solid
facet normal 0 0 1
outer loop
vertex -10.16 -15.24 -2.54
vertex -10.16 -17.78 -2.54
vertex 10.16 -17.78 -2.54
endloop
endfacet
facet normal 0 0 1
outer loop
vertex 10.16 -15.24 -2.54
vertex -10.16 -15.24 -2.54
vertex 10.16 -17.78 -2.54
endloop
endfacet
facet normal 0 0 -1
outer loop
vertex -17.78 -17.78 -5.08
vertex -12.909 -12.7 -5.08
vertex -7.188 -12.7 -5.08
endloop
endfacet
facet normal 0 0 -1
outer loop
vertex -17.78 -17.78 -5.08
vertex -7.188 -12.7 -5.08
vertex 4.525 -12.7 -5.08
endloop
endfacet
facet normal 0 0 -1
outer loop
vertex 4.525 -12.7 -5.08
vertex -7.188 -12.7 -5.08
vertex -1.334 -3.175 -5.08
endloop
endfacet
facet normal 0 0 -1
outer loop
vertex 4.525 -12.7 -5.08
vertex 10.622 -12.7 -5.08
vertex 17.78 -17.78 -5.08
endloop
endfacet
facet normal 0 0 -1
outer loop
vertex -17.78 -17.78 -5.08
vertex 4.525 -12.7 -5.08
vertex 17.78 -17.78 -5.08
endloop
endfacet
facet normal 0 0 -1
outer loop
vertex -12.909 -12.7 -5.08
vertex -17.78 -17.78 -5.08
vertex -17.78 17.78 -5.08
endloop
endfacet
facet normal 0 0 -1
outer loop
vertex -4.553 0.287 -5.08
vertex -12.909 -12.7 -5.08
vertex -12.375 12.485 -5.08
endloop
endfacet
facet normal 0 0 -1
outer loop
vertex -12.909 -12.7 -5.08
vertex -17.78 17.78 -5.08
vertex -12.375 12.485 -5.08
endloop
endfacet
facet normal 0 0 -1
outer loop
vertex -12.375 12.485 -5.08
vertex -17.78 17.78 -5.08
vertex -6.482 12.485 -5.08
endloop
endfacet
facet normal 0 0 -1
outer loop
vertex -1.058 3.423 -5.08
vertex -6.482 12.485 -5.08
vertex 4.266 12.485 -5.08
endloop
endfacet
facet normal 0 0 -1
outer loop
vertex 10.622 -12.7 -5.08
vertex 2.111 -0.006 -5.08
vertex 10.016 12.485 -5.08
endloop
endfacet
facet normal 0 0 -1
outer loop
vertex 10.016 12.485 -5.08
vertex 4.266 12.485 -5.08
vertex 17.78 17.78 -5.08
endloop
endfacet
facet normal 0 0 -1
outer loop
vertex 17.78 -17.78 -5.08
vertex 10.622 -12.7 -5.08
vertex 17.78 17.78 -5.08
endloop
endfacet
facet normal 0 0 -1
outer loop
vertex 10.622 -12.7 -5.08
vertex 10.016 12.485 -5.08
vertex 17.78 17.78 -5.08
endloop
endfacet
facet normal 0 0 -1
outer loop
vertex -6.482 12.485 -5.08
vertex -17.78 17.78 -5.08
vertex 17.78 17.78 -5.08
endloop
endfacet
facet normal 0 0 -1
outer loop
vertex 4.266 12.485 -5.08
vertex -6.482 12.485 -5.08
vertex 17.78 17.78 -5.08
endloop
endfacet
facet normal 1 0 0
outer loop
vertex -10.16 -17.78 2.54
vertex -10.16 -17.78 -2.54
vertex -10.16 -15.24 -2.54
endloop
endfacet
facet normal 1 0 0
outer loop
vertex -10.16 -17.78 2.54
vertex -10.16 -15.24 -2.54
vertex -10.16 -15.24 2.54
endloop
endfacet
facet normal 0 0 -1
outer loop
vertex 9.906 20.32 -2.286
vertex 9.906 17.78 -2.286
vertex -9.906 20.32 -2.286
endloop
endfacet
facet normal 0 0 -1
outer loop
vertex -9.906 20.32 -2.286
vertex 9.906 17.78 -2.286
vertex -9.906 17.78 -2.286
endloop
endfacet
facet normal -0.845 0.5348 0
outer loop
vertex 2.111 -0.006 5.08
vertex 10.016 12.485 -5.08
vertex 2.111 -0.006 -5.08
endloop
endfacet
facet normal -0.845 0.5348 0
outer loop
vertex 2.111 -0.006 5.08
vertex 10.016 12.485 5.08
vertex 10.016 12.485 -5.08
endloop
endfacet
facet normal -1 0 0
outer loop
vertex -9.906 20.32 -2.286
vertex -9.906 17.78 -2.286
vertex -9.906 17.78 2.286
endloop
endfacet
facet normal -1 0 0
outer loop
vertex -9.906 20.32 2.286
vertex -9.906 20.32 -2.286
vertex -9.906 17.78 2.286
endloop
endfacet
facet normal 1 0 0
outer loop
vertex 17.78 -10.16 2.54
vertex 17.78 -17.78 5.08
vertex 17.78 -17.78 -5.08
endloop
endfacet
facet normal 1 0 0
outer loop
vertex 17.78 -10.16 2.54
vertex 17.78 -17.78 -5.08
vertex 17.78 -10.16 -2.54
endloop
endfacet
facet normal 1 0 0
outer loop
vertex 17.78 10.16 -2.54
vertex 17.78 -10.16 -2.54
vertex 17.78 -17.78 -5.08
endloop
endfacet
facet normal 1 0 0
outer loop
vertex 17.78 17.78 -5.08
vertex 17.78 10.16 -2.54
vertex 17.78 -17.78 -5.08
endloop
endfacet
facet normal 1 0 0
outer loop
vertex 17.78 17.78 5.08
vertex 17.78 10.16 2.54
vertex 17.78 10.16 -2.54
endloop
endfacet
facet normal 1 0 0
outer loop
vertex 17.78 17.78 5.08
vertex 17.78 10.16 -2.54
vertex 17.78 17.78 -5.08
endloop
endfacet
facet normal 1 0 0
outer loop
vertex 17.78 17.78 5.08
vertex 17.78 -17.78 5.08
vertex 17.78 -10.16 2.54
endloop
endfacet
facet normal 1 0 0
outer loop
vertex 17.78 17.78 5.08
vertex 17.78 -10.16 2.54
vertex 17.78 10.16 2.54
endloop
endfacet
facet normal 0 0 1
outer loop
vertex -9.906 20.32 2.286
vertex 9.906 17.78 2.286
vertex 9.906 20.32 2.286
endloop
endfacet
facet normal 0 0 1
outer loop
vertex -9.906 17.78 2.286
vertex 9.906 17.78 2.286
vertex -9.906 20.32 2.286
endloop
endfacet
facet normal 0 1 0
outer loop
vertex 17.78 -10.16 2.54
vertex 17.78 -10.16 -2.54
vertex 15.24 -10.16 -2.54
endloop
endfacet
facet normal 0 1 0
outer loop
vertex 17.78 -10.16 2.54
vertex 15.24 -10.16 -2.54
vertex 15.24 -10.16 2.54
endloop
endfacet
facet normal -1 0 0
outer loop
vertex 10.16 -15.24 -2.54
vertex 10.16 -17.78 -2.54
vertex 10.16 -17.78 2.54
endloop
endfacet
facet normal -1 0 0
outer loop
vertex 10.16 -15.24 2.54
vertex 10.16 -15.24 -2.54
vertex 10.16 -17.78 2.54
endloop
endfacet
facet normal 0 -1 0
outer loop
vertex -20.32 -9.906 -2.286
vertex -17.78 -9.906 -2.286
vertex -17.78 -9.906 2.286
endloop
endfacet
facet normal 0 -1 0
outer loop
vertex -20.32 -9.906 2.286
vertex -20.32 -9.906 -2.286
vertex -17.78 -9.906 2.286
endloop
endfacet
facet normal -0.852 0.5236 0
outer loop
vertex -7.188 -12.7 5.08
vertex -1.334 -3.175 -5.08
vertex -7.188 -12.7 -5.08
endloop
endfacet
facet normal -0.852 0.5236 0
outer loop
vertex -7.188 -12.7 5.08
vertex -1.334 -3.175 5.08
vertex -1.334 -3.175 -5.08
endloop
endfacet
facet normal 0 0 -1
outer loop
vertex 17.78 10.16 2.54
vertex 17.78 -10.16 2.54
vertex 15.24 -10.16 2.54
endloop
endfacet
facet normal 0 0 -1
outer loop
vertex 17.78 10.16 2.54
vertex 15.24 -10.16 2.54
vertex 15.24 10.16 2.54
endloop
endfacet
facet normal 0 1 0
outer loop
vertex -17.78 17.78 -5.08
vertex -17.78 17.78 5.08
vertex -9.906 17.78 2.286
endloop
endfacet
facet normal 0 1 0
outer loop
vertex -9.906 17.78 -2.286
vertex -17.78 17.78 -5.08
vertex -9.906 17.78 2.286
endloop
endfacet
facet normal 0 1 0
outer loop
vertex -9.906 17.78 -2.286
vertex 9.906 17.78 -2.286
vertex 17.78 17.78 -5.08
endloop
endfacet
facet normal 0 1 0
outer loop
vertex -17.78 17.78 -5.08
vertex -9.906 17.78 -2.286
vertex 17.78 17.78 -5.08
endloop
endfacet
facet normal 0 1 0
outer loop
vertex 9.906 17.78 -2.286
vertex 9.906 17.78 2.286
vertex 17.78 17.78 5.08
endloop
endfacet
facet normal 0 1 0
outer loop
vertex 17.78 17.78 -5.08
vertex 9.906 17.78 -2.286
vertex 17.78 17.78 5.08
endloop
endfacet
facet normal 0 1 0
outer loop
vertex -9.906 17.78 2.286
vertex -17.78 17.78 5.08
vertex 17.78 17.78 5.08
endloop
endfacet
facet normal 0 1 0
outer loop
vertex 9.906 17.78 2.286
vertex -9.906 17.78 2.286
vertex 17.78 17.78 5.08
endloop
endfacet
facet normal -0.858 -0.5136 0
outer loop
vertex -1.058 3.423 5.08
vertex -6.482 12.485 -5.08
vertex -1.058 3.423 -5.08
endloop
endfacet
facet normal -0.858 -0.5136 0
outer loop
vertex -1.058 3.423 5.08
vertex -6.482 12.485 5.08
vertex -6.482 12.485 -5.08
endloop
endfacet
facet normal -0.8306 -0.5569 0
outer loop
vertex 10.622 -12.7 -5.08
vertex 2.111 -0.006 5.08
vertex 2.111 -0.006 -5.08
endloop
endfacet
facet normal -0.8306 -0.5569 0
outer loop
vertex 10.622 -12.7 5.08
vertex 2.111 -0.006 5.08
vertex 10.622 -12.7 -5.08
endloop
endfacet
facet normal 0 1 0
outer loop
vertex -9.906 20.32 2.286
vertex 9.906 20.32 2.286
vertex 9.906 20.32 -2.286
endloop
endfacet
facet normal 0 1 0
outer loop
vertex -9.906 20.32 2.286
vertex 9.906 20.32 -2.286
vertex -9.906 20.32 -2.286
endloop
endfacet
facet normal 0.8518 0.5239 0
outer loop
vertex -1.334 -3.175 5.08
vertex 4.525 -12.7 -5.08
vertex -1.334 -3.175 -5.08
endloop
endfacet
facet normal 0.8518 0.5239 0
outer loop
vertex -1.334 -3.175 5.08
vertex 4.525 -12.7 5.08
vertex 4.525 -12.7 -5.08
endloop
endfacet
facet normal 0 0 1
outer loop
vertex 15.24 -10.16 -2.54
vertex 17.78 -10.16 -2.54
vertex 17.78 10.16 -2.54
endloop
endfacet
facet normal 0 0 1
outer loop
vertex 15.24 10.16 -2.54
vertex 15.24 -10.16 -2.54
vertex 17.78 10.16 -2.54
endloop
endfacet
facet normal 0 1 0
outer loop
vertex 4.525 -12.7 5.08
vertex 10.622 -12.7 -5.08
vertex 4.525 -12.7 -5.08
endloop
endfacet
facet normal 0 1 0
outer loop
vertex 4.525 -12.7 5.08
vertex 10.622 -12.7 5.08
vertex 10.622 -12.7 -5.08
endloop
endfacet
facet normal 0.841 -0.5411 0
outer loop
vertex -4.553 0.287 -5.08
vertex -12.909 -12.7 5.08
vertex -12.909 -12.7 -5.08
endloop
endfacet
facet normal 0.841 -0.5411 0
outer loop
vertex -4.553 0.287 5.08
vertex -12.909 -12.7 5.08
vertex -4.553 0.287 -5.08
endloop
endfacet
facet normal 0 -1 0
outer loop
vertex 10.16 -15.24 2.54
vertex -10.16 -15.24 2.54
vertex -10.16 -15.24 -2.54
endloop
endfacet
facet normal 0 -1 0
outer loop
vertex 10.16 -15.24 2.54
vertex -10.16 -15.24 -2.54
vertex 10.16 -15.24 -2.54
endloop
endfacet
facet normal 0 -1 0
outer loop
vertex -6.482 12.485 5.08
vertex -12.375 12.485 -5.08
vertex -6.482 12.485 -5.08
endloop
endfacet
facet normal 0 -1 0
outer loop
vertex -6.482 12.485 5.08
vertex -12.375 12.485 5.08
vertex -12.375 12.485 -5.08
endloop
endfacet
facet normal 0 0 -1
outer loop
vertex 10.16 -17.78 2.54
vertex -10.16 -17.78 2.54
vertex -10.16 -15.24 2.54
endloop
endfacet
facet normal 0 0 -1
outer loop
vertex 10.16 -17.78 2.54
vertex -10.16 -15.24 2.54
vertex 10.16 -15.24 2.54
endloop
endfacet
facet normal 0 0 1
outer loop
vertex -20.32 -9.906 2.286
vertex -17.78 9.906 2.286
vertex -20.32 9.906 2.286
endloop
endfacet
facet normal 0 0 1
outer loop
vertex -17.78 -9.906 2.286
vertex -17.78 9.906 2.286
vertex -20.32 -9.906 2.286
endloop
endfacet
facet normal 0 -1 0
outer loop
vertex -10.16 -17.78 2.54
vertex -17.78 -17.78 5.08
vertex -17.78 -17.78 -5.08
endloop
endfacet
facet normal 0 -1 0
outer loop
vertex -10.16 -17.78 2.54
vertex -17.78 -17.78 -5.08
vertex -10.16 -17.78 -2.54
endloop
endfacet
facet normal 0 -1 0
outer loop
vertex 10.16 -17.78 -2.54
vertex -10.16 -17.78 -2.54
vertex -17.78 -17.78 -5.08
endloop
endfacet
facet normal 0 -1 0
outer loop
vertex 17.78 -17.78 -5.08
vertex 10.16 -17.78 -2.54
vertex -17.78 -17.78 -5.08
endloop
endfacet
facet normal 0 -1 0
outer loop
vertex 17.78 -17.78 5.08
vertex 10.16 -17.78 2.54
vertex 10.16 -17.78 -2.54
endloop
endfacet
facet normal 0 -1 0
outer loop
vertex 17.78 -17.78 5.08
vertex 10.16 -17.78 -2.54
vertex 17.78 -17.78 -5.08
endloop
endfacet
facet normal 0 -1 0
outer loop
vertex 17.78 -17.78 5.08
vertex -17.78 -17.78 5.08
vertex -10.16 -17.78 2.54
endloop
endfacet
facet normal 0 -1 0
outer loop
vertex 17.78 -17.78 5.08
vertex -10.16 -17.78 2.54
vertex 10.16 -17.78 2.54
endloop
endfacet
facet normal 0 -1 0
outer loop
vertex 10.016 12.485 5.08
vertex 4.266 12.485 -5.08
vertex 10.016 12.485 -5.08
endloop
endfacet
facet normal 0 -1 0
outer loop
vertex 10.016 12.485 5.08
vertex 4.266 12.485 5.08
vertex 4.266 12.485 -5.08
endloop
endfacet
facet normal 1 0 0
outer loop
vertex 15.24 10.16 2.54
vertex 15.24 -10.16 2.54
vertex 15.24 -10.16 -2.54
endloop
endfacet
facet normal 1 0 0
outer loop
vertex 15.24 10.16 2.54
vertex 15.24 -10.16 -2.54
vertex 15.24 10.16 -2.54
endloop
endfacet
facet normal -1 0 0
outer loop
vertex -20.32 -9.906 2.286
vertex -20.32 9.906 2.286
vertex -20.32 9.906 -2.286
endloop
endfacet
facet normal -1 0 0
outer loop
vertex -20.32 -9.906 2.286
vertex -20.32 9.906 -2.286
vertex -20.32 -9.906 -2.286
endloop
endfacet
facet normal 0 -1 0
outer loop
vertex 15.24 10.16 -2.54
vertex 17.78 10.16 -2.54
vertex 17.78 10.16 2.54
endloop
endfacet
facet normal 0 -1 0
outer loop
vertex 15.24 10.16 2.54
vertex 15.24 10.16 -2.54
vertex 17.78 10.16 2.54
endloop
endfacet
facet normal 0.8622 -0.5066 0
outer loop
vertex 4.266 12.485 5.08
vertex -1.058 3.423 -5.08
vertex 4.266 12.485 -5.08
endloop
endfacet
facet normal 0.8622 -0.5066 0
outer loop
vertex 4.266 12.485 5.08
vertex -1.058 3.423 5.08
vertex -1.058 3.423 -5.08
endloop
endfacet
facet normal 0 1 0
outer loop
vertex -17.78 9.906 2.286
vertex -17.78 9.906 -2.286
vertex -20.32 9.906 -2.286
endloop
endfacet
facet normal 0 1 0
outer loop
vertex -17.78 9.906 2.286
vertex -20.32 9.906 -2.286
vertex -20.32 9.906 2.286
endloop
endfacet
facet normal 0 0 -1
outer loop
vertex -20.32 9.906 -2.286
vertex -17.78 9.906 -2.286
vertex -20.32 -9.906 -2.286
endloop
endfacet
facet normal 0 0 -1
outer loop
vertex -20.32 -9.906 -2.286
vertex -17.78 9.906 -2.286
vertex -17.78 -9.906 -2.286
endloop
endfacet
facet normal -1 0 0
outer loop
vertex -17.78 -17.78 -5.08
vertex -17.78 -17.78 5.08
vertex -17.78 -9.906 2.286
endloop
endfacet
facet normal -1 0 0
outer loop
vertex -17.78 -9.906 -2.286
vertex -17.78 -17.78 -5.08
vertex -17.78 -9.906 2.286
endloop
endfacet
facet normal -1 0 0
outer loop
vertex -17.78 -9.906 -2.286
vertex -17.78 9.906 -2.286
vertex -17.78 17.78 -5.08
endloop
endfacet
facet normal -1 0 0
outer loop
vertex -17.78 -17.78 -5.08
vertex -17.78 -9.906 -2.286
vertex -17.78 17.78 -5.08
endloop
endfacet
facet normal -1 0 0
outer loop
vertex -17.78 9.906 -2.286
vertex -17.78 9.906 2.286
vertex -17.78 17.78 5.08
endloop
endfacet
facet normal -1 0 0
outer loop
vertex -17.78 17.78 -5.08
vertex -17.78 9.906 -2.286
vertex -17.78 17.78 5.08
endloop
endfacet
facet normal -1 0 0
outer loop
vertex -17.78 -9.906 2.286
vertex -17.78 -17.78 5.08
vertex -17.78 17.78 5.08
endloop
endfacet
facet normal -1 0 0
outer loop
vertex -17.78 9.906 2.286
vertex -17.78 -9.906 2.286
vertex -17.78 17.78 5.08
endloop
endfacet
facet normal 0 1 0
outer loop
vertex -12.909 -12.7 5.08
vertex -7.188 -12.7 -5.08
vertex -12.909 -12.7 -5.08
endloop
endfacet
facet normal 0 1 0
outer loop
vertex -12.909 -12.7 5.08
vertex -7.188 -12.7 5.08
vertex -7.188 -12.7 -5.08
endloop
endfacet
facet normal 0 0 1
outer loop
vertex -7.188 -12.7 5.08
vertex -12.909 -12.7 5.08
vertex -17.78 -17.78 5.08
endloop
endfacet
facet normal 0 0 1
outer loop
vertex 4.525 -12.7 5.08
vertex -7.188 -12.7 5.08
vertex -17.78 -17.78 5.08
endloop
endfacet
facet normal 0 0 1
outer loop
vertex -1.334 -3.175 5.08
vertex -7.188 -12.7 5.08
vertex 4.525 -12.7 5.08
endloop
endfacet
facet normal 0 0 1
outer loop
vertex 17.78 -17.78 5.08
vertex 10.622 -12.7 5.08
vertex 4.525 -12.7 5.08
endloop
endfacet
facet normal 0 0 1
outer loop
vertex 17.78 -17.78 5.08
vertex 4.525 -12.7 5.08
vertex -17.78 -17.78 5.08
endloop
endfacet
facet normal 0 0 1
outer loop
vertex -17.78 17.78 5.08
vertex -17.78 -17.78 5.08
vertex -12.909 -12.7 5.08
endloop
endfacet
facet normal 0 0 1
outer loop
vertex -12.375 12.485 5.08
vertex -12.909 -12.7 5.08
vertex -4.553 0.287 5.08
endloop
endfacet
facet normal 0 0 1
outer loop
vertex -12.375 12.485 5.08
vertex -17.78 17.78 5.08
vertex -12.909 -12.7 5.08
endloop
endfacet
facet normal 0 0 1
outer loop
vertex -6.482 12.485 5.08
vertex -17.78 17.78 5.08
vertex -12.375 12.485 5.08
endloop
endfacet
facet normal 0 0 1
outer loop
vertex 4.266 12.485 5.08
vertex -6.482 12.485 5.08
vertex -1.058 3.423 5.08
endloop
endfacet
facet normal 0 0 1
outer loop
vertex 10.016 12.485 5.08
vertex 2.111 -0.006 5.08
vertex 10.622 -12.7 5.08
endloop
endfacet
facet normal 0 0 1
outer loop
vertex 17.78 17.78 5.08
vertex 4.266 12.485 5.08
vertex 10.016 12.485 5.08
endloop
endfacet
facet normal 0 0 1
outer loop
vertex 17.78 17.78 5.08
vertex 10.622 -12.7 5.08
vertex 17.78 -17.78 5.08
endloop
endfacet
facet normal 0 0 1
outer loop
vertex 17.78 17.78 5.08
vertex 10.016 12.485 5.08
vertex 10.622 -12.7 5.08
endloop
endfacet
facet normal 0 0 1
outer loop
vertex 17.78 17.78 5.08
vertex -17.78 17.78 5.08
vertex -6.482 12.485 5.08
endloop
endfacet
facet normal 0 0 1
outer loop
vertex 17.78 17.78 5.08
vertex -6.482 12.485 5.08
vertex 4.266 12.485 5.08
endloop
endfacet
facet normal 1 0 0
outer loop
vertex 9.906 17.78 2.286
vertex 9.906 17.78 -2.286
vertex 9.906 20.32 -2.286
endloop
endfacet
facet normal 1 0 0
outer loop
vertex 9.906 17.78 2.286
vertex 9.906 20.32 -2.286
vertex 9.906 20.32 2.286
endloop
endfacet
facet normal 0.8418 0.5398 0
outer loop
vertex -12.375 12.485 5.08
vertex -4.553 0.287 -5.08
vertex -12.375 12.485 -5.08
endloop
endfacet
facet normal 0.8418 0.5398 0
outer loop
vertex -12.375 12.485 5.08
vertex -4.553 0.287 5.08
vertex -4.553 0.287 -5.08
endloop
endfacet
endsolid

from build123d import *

# Parameters (mm, degrees)
F0_W     = 35.56
F0_H     = 35.56
F1_DEPTH = 5.08
F2_W     = 19.812
F2_H     = 4.572
F3_DEPTH = 2.54
F4_W     = 19.812
F4_H     = 4.572
F5_DEPTH = 2.54
F6_W     = 20.32
F6_H     = 5.08
F7_DEPTH = 2.54
F8_W     = 20.32
F8_H     = 5.08
F9_DEPTH = 2.54


with BuildPart() as f1:
    # F0 (on Top) → F1 (new body, symmetric)
    with BuildSketch(Plane.XY):
        Rectangle(F0_W, F0_H)
        Polygon((2.1111545139, -0.0055121528), (10.6219184028, -12.7), (4.5254774306, -12.7), (-1.3339409722, -3.175), (-7.1878472222, -12.7), (-12.9094618056, -12.7), (-4.5530381944, 0.2866319444), (-12.3747829861, 12.4850260417), (-6.4822916667, 12.4850260417), (-1.0583333333, 3.423046875), (4.26640625, 12.4850260417), (10.0155815972, 12.4850260417), align=None, mode=Mode.SUBTRACT)
    extrude(amount=F1_DEPTH, both=True)

    # F2 (on face) → F3 (join)
    with BuildSketch(Plane(origin=(0, 17.78, 0), x_dir=(-1, 0, 0), z_dir=(0, 1, 0))):
        Rectangle(F2_W, F2_H)
    extrude(amount=F3_DEPTH)

    # F4 (on face) → F5 (join)
    with BuildSketch(Plane(origin=(-17.78, 0, 0), x_dir=(0, -1, 0), z_dir=(-1, 0, 0))):
        Rectangle(F4_W, F4_H)
    extrude(amount=F5_DEPTH)

    # F6 (on face) → F7 (cut)
    with BuildSketch(Plane.XZ.offset(17.78)):
        Rectangle(F6_W, F6_H)
    extrude(amount=-F7_DEPTH, mode=Mode.SUBTRACT)

    # F8 (on face) → F9 (cut)
    with BuildSketch(Plane.YZ.offset(17.78)):
        Rectangle(F8_W, F8_H)
    extrude(amount=-F9_DEPTH, mode=Mode.SUBTRACT)


solid = f1.part
